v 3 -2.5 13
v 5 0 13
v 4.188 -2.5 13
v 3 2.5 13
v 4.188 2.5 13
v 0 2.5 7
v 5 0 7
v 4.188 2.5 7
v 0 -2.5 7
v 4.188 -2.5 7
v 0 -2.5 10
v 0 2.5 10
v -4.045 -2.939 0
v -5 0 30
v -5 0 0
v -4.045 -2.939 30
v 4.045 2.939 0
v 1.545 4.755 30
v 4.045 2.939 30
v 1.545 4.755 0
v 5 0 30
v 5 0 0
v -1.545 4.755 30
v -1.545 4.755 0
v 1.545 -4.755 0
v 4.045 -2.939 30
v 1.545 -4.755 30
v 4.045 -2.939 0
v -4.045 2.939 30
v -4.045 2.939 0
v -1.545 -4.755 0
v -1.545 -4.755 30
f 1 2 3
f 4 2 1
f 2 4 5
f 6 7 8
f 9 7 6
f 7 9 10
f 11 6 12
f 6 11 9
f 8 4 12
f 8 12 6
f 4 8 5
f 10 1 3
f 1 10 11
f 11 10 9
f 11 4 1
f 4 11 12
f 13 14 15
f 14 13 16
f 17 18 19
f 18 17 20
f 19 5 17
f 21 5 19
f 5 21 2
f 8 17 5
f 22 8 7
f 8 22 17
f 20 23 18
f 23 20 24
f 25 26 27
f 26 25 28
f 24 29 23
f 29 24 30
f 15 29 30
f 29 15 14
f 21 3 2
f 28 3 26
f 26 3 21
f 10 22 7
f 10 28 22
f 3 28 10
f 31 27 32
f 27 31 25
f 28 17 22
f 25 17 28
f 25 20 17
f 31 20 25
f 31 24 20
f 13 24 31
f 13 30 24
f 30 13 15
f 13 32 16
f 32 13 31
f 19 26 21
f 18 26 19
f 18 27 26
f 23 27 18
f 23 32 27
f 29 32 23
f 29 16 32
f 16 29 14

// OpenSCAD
difference() {
    translate([0, 0, 0]) {
        cylinder(h = 30, d = 10, $fn = 10);
    }
    difference() {
        translate([5,0,10]) {
            cube([10, 5, 6], center=true);
        }
        translate([0, 0, 10])
            rotate([0, 45, 0])
                translate([-10, 0, 0])
                    cube([20, 20, 20], center=true);
    }
}
